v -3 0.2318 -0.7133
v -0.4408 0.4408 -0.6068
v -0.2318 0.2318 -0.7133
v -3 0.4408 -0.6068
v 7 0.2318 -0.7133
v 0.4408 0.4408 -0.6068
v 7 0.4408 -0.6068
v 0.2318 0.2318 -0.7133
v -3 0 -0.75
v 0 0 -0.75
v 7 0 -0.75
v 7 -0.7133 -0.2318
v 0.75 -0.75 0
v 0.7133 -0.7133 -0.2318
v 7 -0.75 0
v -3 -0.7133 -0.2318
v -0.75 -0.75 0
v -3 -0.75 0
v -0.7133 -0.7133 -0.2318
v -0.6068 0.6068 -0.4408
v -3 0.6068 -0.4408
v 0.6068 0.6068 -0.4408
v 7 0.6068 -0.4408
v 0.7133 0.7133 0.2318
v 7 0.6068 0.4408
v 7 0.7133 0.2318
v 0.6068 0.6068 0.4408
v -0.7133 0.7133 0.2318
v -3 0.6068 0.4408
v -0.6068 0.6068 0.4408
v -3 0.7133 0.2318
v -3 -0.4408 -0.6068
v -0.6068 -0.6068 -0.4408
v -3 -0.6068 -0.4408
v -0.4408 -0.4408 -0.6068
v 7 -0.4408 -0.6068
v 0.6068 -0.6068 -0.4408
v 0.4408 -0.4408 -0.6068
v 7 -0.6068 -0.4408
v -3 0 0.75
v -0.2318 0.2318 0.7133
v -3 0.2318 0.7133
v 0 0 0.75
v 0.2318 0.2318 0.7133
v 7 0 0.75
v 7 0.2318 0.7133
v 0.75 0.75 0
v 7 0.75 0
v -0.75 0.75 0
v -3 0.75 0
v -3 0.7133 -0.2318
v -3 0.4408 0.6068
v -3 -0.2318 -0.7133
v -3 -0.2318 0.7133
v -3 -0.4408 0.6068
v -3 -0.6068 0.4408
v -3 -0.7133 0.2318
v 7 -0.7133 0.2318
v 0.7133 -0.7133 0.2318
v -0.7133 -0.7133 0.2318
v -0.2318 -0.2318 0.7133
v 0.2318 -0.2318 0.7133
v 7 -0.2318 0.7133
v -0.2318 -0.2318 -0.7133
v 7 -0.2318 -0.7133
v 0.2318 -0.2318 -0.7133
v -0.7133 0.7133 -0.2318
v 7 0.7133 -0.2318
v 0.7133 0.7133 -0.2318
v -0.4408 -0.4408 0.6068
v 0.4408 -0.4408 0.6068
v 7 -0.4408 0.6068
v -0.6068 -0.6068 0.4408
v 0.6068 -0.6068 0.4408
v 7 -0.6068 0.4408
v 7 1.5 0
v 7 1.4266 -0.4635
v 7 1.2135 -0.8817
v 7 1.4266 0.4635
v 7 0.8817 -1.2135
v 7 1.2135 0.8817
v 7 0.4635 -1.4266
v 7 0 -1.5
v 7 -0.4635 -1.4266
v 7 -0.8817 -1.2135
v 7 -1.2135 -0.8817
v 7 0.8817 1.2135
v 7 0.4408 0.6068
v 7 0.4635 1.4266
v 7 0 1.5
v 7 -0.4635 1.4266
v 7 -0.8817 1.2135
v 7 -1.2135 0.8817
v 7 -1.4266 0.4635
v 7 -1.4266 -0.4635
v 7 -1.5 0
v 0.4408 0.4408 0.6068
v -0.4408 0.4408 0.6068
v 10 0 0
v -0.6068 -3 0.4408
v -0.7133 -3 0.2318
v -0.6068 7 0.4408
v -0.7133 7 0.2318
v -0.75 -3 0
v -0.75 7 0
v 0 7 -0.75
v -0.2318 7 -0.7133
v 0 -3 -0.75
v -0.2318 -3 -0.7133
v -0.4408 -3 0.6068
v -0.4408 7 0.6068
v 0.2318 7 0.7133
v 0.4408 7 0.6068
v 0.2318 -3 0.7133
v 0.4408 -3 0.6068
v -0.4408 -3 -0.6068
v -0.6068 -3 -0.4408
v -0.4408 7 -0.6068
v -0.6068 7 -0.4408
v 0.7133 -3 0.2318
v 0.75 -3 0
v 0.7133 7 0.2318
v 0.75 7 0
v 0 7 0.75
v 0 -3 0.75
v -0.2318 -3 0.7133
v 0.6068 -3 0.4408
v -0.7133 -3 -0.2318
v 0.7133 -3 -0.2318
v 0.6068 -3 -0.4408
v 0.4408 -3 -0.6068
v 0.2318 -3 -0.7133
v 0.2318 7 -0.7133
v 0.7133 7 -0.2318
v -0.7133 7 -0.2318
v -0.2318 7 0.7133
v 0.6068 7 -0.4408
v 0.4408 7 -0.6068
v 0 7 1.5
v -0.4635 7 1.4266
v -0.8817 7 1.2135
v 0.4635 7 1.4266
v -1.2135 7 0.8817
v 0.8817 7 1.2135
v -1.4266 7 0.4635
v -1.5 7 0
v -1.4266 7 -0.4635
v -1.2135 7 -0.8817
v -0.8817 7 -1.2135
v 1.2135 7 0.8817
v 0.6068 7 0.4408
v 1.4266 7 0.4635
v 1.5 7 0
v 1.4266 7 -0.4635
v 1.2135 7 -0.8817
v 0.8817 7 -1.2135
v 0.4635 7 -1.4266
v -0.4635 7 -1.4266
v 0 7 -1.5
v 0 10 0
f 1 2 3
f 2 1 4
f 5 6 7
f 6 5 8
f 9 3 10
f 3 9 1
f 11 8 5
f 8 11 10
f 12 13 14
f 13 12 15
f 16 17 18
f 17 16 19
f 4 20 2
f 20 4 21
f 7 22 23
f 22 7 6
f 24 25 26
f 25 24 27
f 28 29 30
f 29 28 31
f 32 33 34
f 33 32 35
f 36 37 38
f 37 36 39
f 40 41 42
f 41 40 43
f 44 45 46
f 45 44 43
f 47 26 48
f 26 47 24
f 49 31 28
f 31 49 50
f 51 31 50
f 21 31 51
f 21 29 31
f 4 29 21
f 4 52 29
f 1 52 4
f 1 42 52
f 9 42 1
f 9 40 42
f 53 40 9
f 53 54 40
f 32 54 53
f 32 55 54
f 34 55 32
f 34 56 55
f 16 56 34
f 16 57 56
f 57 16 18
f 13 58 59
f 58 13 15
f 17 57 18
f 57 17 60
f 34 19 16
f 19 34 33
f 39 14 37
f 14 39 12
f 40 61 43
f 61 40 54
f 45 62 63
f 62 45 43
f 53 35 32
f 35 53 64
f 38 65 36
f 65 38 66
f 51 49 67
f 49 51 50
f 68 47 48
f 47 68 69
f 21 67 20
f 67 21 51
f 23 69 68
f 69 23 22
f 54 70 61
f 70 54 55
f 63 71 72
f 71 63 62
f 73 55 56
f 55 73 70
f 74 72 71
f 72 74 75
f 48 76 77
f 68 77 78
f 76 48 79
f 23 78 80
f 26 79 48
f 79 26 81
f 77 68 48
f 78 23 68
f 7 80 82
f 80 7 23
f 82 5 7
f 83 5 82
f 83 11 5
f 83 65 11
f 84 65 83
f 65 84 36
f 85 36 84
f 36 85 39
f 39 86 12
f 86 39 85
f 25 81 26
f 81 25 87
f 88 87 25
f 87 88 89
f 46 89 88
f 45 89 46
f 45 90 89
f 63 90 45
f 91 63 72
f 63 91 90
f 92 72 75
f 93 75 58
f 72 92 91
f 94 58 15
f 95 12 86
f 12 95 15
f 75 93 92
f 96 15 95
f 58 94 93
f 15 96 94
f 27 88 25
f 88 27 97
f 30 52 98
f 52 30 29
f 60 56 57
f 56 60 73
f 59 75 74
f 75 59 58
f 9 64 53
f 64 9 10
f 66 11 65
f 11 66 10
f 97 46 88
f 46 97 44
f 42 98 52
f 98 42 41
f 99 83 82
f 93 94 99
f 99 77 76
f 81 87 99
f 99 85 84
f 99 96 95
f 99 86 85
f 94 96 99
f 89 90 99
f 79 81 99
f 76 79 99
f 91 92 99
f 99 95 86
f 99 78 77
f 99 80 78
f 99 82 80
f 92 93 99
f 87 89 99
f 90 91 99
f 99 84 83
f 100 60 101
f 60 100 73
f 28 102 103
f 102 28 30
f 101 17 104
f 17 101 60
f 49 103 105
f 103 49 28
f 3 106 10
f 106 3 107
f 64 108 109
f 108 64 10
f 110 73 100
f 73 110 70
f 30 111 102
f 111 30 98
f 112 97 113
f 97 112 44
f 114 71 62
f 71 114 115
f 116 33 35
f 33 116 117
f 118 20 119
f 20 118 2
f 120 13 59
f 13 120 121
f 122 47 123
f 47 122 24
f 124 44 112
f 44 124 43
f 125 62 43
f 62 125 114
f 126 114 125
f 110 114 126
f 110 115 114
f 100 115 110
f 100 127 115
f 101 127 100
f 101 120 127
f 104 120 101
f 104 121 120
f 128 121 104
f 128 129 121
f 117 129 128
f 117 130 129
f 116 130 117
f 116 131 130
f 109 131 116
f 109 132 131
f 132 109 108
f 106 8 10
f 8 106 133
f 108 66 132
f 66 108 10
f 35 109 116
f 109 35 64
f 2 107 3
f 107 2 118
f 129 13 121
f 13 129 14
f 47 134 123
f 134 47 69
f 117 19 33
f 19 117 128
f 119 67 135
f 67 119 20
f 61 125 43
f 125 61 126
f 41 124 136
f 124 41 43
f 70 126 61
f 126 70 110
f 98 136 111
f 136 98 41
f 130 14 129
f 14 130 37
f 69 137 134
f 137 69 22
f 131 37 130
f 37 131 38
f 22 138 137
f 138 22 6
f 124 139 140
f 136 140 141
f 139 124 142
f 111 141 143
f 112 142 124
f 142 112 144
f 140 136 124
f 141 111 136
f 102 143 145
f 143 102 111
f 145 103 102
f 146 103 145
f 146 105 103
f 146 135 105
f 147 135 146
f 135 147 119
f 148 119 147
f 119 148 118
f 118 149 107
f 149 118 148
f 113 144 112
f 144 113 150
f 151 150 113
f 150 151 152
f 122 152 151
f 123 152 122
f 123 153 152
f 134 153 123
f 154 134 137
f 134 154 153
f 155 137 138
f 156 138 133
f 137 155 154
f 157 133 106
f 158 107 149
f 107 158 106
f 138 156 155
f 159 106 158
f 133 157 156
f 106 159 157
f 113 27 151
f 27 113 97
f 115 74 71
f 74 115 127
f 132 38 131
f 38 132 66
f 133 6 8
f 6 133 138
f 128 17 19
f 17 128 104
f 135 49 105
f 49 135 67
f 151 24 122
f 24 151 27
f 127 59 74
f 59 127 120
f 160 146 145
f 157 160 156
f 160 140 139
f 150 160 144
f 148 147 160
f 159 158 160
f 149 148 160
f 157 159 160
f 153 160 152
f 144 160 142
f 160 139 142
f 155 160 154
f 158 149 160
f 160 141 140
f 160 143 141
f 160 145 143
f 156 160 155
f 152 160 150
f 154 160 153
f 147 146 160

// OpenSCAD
// Start: lazy_union
default_5_default_5();
// End: lazy_union

// Modules.

// 'PartMaterial undef-default - undef-default'
module default_5_default_5() {
  // 'None : _combine_solids_and_holes'
  union() {
    // 'coordinates : _combine_solids_and_holes'
    union() {
      // 'x_arrow'
      multmatrix(m=[[0.0, 0.0, -1.0, -3.0], [0.0, -1.0, 0.0, 0.0], [-1.0, 0.0, 0.0, 0.0], [0.0, 0.0, 0.0, 1.0]]) {
        // 'x_arrow'
        color(c=[1.0, 0.0, 0.0, 1.0]) {
          // 'x_arrow : _combine_solids_and_holes'
          union() {
            // 'stem'
            multmatrix(m=[[1.0, 0.0, 0.0, 0.0], [-0.0, -1.0, -0.0, -0.0], [-0.0, -0.0, -1.0, -0.0], [0.0, 0.0, 0.0, 1.0]]) {
              // 'stem : _combine_solids_and_holes'
              union() {
                // 'stem'
                cylinder(h=10.0, r1=0.75, r2=0.75, center=false, $fn=20);
              }
            }
            // 'head'
            multmatrix(m=[[1.0, 0.0, 0.0, 0.0], [0.0, -1.0, 0.0, 0.0], [0.0, 0.0, -1.0, -10.0], [0.0, 0.0, 0.0, 1.0]]) {
              // 'head : _combine_solids_and_holes'
              union() {
                // 'head'
                cylinder(h=3.0, r1=1.5, r2=0.0, center=false, $fn=20);
              }
            }
          }
        }
      }
      // 'y_arrow'
      multmatrix(m=[[-1.0, 0.0, 0.0, 0.0], [0.0, 0.0, -1.0, -3.0], [0.0, -1.0, 0.0, 0.0], [0.0, 0.0, 0.0, 1.0]]) {
        // 'y_arrow'
        color(c=[0.0, 0.5019607843137255, 0.0, 1.0]) {
          // 'y_arrow : _combine_solids_and_holes'
          union() {
            // 'stem'
            multmatrix(m=[[1.0, 0.0, 0.0, 0.0], [-0.0, -1.0, -0.0, -0.0], [-0.0, -0.0, -1.0, -0.0], [0.0, 0.0, 0.0, 1.0]]) {
              // 'stem : _combine_solids_and_holes'
              union() {
                // 'stem'
                cylinder(h=10.0, r1=0.75, r2=0.75, center=false, $fn=20);
              }
            }
            // 'head'
            multmatrix(m=[[1.0, 0.0, 0.0, 0.0], [0.0, -1.0, 0.0, 0.0], [0.0, 0.0, -1.0, -10.0], [0.0, 0.0, 0.0, 1.0]]) {
              // 'head : _combine_solids_and_holes'
              union() {
                // 'head'
                cylinder(h=3.0, r1=1.5, r2=0.0, center=false, $fn=20);
              }
            }
          }
        }
      }
    }
  }
} // end module default_5_default_5
